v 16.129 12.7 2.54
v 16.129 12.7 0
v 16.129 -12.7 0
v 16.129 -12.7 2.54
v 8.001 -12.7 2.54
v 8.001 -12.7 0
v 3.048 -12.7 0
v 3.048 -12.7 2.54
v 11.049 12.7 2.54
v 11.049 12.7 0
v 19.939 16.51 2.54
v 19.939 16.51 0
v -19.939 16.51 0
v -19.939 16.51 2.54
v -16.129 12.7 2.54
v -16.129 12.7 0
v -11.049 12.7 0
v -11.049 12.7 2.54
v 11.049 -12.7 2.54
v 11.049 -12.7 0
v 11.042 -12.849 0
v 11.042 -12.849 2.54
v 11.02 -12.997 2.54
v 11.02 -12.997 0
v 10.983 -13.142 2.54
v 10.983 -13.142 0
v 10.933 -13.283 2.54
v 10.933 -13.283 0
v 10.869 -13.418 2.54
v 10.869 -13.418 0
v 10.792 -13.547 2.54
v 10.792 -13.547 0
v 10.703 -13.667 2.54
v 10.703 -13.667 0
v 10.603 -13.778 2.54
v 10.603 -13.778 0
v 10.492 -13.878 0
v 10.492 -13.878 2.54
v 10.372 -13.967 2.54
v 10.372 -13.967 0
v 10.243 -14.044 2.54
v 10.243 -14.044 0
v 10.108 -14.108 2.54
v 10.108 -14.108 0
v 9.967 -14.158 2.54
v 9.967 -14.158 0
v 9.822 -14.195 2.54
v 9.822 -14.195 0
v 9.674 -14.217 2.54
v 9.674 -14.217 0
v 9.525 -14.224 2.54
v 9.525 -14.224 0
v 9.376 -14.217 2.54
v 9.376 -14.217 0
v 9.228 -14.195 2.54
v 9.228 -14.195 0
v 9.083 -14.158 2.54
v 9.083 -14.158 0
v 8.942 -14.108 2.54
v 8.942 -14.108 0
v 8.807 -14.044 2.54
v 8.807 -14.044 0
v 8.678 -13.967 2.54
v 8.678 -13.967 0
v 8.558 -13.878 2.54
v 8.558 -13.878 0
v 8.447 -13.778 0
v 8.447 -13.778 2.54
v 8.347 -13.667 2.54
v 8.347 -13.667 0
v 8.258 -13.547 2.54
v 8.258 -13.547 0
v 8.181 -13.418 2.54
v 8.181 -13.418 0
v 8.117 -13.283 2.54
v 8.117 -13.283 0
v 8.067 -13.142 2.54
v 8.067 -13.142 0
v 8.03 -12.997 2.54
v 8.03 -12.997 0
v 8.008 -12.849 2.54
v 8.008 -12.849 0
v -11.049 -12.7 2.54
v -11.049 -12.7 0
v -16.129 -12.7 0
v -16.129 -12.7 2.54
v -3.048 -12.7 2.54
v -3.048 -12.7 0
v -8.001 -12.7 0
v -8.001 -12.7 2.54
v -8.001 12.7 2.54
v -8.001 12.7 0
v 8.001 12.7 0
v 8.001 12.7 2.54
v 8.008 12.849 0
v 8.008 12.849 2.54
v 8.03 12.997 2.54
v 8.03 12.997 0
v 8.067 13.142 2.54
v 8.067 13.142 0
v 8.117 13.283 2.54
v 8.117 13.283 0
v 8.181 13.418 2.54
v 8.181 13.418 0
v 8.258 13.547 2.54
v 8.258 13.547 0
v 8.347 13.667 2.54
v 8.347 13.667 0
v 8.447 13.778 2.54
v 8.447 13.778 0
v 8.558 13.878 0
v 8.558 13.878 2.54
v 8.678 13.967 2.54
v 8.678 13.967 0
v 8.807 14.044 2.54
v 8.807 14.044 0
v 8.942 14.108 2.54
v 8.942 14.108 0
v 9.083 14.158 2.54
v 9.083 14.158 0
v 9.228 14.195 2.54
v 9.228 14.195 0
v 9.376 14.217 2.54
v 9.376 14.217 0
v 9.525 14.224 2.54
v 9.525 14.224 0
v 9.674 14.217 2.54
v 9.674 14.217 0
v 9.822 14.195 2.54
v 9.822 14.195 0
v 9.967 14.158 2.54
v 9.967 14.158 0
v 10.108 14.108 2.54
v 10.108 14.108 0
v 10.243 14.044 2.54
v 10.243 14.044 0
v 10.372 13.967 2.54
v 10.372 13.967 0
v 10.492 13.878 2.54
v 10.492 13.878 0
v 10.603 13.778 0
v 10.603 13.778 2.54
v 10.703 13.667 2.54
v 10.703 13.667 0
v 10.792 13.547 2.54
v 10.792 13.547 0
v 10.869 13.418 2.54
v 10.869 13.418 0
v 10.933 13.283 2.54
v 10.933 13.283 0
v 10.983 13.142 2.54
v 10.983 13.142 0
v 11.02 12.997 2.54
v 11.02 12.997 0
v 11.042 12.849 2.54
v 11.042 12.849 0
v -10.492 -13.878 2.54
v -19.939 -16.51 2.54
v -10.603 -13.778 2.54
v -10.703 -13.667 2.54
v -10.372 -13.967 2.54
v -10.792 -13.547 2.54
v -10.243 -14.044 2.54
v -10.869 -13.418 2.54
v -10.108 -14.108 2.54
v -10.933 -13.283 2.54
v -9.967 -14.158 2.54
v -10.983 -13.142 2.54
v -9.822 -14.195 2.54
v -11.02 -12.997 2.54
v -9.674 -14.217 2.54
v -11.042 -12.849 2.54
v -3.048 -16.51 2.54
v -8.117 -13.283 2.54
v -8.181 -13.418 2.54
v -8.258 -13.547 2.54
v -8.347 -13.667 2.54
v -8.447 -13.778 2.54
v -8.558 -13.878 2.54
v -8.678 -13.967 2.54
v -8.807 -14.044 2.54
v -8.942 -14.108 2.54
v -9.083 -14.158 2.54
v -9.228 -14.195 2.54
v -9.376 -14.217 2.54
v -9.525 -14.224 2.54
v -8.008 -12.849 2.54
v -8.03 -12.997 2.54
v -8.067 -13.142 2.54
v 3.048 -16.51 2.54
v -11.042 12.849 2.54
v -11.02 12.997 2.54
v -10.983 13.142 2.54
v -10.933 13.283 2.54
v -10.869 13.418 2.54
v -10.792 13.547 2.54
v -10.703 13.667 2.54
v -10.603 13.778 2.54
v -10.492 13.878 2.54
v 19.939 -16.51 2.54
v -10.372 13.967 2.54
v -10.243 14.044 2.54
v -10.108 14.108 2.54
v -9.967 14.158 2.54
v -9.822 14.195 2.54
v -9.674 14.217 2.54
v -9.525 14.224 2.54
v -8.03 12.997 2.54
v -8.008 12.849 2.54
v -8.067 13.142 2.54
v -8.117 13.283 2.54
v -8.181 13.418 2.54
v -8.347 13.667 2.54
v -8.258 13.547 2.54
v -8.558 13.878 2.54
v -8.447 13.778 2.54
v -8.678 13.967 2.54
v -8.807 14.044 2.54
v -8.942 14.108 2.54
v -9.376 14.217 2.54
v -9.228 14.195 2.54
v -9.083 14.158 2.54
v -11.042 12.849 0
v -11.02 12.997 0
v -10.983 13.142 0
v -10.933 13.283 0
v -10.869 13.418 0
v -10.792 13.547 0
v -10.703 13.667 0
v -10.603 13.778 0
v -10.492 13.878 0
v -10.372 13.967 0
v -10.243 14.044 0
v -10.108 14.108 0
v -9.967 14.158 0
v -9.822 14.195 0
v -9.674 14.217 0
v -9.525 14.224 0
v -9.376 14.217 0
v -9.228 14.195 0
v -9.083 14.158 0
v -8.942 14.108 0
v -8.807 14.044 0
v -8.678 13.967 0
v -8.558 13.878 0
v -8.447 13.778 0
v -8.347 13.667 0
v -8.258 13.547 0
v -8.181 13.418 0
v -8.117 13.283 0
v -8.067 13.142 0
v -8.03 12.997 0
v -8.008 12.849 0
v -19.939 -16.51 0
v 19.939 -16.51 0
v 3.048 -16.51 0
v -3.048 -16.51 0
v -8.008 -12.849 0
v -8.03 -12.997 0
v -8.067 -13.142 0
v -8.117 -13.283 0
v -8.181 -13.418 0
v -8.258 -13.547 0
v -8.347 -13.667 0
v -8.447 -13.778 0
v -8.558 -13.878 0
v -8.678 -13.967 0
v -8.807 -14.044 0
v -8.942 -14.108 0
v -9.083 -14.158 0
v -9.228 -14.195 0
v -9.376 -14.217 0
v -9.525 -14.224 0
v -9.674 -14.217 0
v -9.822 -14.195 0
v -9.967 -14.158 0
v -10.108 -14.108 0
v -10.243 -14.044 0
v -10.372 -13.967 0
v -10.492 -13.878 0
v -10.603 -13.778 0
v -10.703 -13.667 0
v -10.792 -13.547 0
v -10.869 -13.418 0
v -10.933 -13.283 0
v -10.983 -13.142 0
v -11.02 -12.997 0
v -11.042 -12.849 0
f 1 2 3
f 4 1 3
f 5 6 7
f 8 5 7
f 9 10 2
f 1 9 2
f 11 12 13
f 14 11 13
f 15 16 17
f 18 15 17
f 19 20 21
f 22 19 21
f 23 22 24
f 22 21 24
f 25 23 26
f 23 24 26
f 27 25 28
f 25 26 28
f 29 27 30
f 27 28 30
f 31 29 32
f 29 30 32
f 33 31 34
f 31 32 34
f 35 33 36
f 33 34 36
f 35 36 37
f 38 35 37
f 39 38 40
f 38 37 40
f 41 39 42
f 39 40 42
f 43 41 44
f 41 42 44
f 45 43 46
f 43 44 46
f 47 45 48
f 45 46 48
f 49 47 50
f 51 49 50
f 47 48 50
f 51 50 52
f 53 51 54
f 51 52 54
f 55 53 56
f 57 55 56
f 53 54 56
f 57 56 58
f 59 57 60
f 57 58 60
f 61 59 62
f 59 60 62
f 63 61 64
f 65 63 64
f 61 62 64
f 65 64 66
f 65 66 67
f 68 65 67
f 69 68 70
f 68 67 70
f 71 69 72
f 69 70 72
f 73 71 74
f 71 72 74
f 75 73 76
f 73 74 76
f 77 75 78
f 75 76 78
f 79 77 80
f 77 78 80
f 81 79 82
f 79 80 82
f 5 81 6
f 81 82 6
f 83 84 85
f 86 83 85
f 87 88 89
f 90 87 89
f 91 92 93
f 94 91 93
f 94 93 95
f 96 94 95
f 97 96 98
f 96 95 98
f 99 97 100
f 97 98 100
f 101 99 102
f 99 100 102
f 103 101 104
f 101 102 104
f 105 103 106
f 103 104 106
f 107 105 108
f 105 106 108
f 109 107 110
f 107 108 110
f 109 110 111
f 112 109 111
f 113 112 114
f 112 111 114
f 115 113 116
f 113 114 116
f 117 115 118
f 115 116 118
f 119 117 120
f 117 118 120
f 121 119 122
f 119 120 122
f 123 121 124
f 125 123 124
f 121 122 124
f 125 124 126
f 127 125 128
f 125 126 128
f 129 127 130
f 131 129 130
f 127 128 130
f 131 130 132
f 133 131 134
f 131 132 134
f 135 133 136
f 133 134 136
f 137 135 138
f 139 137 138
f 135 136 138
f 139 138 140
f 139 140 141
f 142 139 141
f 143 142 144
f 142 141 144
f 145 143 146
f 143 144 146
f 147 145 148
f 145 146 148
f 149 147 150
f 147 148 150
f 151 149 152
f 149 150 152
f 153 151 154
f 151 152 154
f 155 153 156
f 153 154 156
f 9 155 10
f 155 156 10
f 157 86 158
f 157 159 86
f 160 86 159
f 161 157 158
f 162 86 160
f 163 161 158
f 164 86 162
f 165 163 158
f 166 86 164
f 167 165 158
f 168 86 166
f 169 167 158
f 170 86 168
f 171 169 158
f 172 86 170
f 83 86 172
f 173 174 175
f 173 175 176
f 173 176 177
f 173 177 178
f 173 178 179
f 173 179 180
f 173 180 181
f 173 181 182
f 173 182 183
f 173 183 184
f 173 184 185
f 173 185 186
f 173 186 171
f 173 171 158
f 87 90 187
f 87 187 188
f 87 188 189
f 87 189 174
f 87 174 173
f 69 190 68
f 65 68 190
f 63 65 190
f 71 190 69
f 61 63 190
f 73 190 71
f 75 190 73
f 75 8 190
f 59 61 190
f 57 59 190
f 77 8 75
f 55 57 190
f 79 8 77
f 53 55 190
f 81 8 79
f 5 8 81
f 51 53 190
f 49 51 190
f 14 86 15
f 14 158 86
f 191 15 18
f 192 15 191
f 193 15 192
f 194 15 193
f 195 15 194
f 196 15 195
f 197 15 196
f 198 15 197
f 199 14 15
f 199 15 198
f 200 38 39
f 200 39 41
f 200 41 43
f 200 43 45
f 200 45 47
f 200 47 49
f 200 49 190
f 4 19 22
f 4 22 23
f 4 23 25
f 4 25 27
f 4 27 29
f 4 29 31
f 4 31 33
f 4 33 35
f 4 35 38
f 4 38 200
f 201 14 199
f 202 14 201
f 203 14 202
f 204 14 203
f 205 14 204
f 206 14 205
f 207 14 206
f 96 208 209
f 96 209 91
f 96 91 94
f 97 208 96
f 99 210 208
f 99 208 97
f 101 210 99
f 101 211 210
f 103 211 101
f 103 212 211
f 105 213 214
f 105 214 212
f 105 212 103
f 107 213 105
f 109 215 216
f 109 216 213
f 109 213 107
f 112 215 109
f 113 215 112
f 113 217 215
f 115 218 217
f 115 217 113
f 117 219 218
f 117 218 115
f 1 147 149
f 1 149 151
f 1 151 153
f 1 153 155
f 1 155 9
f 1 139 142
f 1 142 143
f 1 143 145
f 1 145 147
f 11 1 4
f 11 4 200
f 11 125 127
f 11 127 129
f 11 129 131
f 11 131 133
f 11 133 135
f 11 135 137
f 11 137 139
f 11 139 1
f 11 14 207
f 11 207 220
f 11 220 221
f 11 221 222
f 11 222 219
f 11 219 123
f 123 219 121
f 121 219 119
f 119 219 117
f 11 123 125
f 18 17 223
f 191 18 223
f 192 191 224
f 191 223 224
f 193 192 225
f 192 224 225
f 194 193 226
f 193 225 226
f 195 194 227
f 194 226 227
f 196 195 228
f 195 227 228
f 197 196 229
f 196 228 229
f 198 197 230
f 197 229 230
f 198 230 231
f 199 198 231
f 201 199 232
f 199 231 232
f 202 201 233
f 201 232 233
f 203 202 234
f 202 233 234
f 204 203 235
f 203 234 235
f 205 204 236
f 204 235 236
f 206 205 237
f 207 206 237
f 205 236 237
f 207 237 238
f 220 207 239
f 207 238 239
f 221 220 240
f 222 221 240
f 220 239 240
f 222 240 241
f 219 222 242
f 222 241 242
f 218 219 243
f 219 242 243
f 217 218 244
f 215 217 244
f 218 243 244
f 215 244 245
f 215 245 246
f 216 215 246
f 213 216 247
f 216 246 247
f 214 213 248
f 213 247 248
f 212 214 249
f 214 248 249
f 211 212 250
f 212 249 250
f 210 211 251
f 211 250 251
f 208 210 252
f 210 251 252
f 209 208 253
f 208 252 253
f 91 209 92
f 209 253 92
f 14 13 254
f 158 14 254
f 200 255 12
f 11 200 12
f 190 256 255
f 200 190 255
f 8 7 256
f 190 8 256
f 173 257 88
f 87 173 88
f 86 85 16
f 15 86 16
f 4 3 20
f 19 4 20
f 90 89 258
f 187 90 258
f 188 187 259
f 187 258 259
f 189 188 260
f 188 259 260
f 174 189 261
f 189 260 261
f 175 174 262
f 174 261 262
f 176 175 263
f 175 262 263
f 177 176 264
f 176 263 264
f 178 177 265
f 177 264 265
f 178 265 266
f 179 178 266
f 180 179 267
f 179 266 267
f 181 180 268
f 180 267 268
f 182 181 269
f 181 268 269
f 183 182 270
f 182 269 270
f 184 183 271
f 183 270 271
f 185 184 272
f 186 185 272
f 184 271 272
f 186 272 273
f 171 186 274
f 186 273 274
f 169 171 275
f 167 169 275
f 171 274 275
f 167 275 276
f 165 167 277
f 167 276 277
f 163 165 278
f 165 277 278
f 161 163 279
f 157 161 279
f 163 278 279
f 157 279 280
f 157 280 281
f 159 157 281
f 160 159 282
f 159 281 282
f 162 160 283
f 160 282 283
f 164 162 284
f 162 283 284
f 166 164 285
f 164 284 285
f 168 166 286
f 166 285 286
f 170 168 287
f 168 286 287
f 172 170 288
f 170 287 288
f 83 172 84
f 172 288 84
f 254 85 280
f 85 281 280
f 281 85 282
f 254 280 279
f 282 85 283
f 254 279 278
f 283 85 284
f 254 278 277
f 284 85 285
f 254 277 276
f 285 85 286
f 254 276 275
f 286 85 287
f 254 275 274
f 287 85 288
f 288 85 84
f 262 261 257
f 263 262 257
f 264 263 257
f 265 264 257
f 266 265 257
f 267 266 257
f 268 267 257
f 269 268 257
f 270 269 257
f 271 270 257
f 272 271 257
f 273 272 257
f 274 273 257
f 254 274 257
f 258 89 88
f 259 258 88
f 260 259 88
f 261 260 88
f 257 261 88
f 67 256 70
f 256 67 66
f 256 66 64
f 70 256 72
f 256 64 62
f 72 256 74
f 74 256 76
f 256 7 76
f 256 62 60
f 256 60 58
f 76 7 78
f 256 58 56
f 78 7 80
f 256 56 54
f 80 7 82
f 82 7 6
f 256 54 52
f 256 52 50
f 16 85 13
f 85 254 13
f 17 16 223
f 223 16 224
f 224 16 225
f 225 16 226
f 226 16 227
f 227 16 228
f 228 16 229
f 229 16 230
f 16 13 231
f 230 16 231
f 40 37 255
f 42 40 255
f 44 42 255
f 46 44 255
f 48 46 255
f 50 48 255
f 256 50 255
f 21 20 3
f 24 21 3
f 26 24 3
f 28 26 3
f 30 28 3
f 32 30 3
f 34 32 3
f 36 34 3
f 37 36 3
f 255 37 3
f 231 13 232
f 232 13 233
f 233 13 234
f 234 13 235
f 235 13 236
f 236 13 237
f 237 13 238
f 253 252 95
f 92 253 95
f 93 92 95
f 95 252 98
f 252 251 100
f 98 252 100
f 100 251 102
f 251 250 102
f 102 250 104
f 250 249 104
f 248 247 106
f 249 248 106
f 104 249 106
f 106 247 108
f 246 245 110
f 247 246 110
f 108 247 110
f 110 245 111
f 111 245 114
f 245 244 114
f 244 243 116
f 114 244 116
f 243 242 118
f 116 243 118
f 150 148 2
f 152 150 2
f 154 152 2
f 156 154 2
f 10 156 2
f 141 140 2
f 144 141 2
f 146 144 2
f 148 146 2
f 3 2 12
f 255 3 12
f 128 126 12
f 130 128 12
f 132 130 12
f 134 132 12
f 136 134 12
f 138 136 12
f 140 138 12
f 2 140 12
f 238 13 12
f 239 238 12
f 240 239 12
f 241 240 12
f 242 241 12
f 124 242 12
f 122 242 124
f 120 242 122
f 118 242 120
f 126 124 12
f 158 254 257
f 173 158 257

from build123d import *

# Parameters (mm, degrees)
F1_DEPTH = 2.54


with BuildPart() as f1:
    # F0 (on Top) → F1 (new body)
    with BuildSketch(Plane.XY):
        with BuildLine():
            Line((19.939, 16.51), (-19.939, 16.51))
            Line((-19.939, 16.51), (-19.939, -16.51))
            Line((-19.939, -16.51), (-3.048, -16.51))
            Line((-3.048, -16.51), (-3.048, -12.7))
            Line((-3.048, -12.7), (-8.001, -12.7))
            ThreePointArc((-8.001, -12.7), (-9.525, -14.224), (-11.049, -12.7))
            Line((-11.049, -12.7), (-16.129, -12.7))
            Line((-16.129, -12.7), (-16.129, 12.7))
            Line((-16.129, 12.7), (-11.049, 12.7))
            ThreePointArc((-11.049, 12.7), (-9.525, 14.224), (-8.001, 12.7))
            Line((-8.001, 12.7), (8.001, 12.7))
            ThreePointArc((8.001, 12.7), (9.525, 14.224), (11.049, 12.7))
            Line((11.049, 12.7), (16.129, 12.7))
            Line((16.129, 12.7), (16.129, -12.7))
            Line((16.129, -12.7), (11.049, -12.7))
            ThreePointArc((11.049, -12.7), (9.525, -14.224), (8.001, -12.7))
            Line((8.001, -12.7), (3.048, -12.7))
            Line((3.048, -12.7), (3.048, -16.51))
            Line((3.048, -16.51), (19.939, -16.51))
            Line((19.939, -16.51), (19.939, 16.51))
        make_face()
    extrude(amount=F1_DEPTH)


solid = f1.part
